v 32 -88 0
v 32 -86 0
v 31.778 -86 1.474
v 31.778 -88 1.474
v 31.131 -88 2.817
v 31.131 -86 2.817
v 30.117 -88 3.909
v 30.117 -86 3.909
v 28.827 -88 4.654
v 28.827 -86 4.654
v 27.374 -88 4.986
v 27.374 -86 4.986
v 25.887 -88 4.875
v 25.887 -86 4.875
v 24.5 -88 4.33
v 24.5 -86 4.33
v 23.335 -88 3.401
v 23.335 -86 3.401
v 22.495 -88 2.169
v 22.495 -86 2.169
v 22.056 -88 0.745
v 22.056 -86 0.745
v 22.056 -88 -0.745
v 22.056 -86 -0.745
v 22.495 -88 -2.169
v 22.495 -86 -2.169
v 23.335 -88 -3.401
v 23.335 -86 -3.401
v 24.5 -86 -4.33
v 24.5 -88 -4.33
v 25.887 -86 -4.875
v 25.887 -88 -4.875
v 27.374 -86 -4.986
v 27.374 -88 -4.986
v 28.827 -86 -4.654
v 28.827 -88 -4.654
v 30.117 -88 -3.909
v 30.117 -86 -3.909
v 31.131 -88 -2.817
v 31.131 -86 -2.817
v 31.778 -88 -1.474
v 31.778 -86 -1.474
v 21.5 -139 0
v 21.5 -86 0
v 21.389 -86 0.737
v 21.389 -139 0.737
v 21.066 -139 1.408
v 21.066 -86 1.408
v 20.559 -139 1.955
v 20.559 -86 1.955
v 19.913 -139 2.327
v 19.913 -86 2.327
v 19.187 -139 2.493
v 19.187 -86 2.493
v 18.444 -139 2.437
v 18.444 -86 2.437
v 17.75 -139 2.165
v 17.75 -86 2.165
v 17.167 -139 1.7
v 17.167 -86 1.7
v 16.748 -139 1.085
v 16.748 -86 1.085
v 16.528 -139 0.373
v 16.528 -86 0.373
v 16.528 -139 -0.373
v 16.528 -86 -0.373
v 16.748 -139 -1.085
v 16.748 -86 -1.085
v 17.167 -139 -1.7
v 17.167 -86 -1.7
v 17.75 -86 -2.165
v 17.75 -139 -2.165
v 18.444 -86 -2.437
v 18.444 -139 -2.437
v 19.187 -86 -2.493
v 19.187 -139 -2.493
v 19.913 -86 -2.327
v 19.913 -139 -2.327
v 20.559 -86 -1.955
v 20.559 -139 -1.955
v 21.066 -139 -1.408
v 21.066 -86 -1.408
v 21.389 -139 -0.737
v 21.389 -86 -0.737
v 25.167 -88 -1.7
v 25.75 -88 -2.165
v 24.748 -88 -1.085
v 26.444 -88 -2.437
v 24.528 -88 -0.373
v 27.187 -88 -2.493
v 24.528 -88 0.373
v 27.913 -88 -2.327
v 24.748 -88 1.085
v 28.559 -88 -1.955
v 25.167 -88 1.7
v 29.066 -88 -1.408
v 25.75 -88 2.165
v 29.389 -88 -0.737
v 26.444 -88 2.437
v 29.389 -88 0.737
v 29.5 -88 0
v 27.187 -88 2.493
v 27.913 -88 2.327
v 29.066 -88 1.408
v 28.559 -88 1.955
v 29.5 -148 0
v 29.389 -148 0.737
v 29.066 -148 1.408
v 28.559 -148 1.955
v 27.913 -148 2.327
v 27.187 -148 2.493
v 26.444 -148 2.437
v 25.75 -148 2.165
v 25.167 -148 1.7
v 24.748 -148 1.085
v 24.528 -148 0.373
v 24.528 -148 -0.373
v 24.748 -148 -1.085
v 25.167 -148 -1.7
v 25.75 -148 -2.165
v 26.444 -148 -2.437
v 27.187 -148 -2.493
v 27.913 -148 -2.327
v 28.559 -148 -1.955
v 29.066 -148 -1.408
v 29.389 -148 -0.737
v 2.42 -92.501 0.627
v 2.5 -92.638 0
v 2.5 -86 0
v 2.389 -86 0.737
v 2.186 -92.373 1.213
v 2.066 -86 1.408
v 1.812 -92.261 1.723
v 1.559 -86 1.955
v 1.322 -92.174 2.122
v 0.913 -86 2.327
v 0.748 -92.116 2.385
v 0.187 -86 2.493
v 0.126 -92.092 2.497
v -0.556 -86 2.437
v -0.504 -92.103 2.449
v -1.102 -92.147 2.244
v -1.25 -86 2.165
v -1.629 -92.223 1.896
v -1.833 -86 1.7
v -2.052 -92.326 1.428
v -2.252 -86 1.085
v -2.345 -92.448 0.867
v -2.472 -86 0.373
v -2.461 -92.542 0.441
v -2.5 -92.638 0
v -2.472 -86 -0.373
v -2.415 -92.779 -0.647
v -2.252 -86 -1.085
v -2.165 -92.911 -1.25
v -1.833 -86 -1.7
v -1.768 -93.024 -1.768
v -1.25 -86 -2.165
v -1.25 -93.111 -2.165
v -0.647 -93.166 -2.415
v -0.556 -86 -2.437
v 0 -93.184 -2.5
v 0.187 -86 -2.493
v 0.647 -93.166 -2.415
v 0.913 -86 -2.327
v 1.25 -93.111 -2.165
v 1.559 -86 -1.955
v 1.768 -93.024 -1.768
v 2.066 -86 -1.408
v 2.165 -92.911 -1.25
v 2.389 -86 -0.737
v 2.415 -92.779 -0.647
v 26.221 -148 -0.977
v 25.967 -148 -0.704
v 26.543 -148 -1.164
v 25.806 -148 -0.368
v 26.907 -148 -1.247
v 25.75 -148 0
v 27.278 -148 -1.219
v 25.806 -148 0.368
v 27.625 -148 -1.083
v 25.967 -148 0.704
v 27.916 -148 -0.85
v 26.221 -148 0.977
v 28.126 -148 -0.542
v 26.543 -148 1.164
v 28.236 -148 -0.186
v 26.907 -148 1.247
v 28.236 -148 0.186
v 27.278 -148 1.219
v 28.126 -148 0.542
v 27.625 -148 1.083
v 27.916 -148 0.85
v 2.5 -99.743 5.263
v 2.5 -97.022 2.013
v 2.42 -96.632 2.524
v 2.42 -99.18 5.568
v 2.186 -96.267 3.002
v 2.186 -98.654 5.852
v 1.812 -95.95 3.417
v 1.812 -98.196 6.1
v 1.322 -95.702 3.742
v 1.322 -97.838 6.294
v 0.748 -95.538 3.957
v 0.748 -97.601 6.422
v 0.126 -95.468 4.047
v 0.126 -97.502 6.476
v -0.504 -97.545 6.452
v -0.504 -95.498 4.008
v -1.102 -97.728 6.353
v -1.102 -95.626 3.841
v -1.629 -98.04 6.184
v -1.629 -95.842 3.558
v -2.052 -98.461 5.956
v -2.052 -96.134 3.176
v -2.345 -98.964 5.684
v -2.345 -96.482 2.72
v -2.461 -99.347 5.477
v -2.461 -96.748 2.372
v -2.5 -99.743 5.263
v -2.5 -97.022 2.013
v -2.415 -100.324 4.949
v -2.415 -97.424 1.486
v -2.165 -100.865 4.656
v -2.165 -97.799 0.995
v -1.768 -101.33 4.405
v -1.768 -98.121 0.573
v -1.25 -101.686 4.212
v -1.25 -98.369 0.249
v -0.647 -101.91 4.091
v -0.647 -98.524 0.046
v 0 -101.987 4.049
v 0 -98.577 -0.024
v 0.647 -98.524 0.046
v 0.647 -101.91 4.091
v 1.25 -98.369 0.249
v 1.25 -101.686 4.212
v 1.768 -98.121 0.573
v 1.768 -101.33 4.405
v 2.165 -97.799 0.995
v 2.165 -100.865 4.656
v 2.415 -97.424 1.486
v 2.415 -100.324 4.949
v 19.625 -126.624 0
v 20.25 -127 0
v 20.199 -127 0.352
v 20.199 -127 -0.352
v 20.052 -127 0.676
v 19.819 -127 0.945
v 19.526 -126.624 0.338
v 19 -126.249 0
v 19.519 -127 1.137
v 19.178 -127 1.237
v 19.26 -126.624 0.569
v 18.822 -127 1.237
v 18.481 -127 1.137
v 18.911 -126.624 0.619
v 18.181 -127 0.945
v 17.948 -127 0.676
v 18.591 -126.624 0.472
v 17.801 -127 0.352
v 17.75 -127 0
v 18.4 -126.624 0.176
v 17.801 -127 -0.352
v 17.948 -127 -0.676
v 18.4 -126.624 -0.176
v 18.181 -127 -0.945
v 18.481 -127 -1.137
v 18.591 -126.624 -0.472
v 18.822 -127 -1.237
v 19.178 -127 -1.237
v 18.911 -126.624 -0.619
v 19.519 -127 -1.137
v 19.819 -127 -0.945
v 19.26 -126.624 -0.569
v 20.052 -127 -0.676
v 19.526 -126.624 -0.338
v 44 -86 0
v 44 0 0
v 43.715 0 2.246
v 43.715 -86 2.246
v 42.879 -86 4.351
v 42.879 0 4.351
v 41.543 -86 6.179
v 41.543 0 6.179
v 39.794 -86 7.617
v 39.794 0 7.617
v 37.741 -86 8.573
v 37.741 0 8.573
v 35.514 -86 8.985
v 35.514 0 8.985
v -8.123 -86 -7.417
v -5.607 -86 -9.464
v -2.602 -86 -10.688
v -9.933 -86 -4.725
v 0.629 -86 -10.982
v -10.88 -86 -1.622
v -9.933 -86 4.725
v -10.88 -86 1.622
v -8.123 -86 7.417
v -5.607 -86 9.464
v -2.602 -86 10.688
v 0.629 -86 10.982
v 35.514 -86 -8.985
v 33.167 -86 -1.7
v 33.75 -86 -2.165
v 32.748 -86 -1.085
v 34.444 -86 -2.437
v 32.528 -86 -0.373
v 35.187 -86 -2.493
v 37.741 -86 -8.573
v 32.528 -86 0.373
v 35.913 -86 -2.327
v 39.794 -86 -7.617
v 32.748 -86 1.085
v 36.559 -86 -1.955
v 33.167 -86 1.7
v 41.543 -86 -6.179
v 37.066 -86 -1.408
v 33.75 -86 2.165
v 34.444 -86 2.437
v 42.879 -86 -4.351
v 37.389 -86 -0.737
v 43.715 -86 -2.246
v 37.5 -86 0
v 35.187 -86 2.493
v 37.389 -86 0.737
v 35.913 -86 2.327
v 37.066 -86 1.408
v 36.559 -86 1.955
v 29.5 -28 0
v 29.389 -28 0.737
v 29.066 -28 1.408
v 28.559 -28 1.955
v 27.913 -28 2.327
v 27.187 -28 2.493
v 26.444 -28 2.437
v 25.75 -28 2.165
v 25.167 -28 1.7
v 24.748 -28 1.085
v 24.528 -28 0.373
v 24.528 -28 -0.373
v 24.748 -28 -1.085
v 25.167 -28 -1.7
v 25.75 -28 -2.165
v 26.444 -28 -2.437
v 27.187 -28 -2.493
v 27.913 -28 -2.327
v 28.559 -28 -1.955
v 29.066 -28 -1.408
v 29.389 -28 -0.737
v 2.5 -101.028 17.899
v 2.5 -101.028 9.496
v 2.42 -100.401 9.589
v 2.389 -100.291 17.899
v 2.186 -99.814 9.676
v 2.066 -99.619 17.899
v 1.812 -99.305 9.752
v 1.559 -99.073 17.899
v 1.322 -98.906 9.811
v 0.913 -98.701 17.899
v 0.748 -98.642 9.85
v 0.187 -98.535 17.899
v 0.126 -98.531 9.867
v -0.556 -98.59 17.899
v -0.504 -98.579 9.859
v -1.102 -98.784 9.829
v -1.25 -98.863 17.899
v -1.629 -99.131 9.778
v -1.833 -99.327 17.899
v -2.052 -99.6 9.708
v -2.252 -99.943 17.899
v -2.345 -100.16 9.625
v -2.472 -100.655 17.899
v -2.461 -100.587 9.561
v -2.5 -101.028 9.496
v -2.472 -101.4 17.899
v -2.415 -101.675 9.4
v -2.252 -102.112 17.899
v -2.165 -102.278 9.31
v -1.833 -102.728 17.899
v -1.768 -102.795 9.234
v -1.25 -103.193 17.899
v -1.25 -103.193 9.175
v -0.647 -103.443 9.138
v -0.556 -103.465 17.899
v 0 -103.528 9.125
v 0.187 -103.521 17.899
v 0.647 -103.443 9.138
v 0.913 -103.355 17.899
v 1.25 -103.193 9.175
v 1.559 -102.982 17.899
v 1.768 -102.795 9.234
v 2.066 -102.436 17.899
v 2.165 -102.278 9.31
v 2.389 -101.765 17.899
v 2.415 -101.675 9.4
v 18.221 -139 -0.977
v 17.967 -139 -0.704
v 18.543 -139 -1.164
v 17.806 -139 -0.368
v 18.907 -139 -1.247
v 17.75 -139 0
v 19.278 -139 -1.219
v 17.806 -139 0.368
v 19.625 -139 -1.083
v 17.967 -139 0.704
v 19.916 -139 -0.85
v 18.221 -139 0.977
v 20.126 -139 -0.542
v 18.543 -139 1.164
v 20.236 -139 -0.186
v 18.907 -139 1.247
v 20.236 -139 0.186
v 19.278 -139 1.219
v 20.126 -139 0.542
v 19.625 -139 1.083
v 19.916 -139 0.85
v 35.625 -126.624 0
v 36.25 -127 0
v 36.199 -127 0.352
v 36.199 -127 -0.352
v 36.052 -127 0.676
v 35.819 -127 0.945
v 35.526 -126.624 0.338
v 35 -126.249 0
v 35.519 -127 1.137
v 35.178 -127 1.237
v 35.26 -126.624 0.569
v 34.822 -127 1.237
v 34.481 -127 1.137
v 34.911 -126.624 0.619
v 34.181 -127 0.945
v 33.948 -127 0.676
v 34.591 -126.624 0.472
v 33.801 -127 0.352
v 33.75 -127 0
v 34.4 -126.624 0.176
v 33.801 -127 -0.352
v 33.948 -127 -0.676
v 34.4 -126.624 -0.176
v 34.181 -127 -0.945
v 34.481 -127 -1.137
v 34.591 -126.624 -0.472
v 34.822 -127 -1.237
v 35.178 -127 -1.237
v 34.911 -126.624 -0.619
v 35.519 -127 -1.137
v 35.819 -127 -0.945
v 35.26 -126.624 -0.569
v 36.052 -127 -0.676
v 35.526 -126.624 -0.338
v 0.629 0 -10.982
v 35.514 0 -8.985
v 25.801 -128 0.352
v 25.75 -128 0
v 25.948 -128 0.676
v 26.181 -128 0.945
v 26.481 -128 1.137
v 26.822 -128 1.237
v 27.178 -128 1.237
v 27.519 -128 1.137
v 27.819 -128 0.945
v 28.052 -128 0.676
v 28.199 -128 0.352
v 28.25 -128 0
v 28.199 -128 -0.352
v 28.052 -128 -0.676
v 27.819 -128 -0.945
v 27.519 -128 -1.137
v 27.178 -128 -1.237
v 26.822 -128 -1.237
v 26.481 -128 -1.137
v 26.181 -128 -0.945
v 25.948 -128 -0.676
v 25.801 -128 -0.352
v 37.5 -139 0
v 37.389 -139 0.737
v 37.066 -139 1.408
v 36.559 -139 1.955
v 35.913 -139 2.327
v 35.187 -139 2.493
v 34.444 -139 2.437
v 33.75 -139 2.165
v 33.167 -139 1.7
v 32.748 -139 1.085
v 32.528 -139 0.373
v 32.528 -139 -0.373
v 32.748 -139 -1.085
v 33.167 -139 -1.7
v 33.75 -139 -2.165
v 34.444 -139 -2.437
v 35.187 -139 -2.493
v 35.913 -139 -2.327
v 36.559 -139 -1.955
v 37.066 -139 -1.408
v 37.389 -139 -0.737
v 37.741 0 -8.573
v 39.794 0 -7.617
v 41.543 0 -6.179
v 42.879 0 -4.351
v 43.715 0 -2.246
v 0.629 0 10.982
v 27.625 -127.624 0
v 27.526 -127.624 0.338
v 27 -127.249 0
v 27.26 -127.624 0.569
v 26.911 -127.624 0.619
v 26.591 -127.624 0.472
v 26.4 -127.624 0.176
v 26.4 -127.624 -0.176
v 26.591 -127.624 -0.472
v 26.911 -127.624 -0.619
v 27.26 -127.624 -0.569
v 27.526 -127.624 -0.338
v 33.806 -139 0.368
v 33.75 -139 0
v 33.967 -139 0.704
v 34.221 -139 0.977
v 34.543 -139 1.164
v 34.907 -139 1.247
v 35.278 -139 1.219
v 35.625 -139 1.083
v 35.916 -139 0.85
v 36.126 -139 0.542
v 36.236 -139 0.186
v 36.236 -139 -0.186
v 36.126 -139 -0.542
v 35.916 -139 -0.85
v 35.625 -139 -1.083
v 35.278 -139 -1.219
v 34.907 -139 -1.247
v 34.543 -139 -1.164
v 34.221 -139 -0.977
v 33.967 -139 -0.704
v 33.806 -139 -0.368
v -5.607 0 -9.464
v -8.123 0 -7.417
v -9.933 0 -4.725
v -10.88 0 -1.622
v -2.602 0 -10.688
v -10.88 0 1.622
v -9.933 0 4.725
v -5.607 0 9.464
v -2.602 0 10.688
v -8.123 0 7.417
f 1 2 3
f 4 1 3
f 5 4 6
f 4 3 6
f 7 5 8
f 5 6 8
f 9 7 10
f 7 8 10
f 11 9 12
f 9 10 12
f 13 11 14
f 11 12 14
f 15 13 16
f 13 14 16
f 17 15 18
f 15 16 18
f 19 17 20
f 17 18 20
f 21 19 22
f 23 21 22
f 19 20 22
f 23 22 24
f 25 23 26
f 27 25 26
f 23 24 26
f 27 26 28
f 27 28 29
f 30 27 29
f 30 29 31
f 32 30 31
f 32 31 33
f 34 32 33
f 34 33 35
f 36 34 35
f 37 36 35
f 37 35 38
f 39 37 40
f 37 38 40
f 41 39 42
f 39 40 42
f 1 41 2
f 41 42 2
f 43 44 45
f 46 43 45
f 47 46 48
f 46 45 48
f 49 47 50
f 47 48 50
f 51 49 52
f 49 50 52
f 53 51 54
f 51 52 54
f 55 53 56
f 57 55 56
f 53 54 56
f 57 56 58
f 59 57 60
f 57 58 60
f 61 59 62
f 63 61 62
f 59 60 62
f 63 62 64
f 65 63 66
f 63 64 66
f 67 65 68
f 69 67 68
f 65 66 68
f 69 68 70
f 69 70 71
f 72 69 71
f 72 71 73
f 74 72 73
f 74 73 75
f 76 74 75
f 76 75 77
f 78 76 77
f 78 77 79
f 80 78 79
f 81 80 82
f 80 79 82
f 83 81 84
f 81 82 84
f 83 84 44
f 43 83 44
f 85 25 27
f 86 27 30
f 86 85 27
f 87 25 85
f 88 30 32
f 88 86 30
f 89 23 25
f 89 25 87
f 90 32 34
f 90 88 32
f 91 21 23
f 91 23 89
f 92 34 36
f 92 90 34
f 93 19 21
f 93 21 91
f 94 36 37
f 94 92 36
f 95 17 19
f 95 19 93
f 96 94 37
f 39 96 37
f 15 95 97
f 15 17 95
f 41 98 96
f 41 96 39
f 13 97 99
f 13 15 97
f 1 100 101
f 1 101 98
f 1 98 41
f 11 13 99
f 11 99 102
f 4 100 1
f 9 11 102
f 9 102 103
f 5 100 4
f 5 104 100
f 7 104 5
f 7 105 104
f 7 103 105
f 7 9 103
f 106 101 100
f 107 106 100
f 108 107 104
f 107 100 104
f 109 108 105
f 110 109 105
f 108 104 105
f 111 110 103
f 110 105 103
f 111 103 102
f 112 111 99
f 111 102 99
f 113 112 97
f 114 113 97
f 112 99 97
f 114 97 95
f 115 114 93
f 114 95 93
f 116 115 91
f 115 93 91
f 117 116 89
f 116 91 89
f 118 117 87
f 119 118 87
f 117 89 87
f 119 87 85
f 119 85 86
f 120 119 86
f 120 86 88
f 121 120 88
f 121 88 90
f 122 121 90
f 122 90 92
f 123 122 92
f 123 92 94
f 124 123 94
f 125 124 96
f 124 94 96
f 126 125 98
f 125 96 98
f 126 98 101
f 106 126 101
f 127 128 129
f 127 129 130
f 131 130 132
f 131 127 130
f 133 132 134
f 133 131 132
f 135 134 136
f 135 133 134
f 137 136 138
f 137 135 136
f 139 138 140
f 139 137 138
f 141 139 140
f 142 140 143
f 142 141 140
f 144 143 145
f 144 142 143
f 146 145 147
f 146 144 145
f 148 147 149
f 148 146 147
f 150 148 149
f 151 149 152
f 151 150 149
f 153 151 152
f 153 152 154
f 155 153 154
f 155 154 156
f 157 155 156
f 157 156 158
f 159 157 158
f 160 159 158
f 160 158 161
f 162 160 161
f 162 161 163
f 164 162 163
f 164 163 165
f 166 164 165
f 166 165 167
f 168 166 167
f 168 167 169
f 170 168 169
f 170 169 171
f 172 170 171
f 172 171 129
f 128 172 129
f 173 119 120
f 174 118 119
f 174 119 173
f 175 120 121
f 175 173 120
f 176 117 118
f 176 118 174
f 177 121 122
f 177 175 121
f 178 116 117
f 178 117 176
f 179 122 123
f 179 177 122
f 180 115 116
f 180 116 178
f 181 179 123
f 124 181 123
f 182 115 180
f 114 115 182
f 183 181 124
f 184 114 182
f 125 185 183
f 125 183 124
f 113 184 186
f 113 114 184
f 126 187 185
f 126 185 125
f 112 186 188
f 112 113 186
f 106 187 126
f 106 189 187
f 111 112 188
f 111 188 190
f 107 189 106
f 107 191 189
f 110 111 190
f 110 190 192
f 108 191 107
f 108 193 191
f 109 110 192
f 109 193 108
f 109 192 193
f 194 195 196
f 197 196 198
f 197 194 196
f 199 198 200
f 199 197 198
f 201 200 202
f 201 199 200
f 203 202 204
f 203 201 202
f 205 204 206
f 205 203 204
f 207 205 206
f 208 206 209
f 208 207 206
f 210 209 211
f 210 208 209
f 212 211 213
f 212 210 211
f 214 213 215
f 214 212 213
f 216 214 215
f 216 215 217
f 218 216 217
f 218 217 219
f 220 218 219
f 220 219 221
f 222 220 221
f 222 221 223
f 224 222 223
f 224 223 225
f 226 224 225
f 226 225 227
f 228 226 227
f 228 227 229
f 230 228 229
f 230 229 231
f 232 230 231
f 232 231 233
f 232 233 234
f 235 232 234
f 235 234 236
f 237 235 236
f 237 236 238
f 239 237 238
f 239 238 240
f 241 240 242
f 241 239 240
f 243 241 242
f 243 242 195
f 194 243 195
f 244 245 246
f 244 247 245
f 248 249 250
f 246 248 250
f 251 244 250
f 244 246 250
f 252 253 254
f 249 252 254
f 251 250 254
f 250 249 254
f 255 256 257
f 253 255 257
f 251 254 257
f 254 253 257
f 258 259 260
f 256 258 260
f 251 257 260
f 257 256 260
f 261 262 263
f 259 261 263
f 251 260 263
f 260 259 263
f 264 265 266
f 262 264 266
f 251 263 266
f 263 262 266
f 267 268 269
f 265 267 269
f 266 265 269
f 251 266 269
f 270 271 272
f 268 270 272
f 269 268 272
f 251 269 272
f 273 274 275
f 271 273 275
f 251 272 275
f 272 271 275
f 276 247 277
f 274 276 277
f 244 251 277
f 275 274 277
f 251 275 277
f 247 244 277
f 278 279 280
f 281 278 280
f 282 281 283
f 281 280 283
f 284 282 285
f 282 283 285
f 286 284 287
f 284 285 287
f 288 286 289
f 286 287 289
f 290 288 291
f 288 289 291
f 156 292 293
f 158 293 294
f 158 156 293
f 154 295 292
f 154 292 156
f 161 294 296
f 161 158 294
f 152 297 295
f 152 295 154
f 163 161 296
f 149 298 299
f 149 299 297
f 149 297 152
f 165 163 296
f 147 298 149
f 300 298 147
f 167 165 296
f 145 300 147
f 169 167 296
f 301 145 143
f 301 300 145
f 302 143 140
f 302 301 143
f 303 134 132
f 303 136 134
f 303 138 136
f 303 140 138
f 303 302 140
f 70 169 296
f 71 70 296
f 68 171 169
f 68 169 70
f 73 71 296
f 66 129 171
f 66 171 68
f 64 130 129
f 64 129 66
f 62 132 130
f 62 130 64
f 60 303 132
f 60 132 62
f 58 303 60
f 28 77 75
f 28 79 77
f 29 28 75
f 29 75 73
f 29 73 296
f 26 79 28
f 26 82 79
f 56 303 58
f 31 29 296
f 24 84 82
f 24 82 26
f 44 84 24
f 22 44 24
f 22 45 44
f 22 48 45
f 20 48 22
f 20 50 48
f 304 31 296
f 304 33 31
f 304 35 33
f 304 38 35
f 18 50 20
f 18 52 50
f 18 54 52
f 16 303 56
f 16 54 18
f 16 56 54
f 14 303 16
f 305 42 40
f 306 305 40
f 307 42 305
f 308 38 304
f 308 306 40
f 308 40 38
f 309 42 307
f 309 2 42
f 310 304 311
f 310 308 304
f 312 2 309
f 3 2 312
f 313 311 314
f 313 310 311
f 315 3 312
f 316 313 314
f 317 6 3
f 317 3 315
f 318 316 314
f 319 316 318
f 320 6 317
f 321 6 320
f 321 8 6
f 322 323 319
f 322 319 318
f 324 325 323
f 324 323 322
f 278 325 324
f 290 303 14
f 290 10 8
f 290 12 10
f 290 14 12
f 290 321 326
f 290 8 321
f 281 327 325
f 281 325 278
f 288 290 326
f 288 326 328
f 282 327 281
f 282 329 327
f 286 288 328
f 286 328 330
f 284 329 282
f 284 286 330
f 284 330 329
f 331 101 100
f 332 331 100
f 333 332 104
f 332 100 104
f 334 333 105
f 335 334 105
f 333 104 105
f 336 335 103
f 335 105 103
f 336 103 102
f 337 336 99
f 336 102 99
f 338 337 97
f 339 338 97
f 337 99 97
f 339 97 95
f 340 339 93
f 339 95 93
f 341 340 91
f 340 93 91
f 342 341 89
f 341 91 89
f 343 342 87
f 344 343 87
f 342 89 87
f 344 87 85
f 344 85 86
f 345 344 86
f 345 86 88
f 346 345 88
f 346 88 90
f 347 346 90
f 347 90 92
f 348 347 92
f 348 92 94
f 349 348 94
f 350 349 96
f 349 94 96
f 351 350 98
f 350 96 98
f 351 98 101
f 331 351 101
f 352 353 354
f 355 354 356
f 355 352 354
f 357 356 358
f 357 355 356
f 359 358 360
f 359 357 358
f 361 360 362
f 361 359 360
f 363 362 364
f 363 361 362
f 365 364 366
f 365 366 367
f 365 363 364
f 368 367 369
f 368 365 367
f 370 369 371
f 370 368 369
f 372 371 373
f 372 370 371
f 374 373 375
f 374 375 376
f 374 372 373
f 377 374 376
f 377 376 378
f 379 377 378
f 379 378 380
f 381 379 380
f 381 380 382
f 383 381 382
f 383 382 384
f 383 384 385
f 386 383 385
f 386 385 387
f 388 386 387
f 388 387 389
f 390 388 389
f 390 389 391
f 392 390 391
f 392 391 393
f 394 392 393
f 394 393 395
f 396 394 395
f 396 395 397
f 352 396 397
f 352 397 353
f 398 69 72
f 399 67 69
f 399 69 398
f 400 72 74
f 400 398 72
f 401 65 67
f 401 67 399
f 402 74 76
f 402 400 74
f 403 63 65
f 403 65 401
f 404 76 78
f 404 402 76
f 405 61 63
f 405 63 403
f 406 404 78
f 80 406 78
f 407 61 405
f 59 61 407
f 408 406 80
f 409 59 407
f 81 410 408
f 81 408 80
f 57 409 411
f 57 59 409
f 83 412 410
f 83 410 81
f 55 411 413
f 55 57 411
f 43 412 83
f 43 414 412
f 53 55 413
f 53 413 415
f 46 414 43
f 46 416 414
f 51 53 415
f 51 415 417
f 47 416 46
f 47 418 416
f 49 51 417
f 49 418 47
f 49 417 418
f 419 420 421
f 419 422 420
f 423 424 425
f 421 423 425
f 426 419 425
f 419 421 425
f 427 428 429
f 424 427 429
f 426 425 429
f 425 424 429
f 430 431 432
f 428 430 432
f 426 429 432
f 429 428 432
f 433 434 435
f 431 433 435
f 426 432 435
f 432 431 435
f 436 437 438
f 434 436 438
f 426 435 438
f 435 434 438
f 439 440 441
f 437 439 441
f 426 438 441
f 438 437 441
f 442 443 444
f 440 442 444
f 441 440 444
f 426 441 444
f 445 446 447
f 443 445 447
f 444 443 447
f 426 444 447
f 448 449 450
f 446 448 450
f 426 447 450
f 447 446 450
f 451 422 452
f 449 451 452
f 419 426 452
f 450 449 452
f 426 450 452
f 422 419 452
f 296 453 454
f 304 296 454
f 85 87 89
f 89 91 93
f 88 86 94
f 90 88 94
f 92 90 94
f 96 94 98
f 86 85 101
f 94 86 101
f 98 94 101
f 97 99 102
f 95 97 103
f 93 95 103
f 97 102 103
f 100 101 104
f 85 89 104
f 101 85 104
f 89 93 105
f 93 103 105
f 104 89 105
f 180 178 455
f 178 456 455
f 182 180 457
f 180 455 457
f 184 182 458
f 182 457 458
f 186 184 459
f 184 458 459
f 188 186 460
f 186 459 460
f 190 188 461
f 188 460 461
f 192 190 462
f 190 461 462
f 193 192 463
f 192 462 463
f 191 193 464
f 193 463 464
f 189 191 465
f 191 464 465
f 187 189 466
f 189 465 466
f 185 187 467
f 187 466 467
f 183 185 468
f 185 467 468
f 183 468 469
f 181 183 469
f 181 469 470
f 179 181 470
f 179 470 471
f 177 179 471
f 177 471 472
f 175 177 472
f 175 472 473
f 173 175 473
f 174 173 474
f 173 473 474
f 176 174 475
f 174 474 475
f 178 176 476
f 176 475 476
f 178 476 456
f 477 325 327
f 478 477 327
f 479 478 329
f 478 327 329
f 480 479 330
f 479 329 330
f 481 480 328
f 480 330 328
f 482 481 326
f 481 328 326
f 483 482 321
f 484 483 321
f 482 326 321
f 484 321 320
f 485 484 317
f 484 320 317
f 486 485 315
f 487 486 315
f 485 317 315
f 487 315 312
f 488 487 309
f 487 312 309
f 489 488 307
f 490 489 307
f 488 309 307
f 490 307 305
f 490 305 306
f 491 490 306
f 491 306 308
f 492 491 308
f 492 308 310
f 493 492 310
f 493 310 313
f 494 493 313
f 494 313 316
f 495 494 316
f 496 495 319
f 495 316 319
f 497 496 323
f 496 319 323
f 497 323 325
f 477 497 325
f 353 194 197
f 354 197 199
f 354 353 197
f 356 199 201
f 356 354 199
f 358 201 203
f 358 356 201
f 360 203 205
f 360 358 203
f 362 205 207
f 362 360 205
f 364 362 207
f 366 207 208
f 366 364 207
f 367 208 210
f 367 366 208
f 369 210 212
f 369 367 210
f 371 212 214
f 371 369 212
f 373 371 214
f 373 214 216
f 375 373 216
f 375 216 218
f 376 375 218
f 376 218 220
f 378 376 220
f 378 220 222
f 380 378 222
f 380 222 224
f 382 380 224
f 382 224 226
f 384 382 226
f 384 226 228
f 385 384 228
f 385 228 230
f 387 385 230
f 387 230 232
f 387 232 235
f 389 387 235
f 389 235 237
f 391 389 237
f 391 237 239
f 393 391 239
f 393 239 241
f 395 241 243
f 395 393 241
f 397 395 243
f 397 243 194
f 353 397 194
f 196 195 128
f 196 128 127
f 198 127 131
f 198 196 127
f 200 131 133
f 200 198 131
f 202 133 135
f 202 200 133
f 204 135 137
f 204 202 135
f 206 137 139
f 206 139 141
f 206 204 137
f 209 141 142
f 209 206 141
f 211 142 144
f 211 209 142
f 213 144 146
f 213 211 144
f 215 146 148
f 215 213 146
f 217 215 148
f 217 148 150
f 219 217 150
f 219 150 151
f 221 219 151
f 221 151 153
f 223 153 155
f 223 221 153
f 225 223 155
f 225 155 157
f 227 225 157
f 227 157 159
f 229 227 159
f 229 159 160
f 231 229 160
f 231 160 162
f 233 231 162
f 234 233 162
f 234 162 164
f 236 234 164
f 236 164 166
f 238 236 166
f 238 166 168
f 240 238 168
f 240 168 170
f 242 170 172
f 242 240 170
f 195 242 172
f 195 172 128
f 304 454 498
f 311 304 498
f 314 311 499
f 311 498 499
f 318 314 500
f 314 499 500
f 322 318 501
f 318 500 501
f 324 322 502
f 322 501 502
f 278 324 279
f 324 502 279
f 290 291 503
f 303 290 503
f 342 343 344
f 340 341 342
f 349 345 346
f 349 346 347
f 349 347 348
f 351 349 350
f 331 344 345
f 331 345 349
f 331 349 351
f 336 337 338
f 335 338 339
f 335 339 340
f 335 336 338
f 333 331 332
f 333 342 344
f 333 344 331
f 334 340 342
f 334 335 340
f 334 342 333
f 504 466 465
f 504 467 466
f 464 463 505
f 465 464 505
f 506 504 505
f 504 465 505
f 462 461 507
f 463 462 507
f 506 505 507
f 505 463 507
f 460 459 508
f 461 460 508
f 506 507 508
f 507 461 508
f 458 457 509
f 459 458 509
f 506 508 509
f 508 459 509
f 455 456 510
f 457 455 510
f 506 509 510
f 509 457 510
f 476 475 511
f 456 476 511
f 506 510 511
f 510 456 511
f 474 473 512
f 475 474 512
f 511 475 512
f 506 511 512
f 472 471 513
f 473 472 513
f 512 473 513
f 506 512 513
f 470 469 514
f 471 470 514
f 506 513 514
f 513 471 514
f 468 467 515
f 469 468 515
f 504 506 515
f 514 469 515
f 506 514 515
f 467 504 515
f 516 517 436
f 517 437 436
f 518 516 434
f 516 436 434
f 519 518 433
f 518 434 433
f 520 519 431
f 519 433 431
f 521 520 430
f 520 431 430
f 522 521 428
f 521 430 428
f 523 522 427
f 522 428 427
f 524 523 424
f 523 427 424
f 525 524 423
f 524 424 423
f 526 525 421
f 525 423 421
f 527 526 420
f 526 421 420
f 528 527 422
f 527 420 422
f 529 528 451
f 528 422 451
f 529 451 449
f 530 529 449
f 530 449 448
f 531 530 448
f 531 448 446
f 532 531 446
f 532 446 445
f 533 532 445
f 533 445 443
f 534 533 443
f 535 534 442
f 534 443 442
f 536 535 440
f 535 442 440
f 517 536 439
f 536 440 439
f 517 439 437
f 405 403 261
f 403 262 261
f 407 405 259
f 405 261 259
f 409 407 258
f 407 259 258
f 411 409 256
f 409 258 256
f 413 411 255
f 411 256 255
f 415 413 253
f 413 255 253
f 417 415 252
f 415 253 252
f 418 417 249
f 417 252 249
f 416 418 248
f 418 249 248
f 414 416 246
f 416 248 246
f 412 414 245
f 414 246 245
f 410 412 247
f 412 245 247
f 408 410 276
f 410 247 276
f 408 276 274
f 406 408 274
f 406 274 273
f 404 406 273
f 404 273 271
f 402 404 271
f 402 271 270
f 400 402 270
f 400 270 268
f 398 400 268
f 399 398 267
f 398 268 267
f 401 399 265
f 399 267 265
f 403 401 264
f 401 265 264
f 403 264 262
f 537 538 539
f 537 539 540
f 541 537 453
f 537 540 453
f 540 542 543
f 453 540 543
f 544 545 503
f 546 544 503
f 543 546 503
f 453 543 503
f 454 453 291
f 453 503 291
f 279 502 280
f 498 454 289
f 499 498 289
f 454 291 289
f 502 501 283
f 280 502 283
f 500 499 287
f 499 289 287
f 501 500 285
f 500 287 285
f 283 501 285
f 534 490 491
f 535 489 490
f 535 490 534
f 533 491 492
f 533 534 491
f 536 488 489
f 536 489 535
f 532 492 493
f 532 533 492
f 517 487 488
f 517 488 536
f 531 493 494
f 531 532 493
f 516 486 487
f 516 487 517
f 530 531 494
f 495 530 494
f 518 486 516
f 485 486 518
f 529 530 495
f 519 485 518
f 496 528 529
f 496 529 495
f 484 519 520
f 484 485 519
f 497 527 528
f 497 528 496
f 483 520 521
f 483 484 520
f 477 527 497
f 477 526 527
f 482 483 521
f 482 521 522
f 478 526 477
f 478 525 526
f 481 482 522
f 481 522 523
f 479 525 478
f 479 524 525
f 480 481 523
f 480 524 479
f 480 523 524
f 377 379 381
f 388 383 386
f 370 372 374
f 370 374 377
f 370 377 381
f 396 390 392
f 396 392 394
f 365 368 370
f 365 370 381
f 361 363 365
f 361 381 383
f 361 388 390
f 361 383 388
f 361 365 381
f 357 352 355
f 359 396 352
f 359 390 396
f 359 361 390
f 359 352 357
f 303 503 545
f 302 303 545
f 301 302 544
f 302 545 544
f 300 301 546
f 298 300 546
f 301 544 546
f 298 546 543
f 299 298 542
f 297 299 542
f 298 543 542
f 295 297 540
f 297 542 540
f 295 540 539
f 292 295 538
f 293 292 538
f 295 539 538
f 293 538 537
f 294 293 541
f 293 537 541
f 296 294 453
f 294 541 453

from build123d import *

# Parameters (mm, degrees)
F1_DEPTH  = 86
F2_R      = 5
F3_DEPTH  = 2
F2_R_2    = 2.5
F4_DEPTH  = 53
F5_R      = 2.5
F6_DEPTH  = 60
F7_DEPTH  = 60
F9_D      = 2.5
F9_DEPTH  = 12
F9_TIP    = 0.7510757738
F11_D     = 2.5
F11_DEPTH = 20
F11_TIP   = 0.7510757738


with BuildPart() as f1:
    # F0 (on Front) → F1 (new body)
    with BuildSketch(Plane.XZ):
        with BuildLine():
            ThreePointArc((0.6285714286, -10.9820261318), (7.99732098, -7.5526721856), (11, 0))
            ThreePointArc((11, 0), (7.99732098, 7.5526721856), (0.6285714286, 10.9820261318))
            ThreePointArc((0.6285714286, 10.9820261318), (-11, 0), (0.6285714286, -10.9820261318))
        make_face()
        with BuildLine():
            ThreePointArc((0.6285714286, 10.9820261318), (7.99732098, 7.5526721856), (11, 0))
            ThreePointArc((11, 0), (7.99732098, -7.5526721856), (0.6285714286, -10.9820261318))
            Line((0.6285714286, -10.9820261318), (35.5142857143, -8.9852941078))
            ThreePointArc((35.5142857143, -8.9852941078), (26, 0), (35.5142857143, 8.9852941078))
            Line((35.5142857143, 8.9852941078), (0.6285714286, 10.9820261318))
        make_face()
        with BuildLine():
            ThreePointArc((44, 0), (41.54326262, 6.1794590609), (35.5142857143, 8.9852941078))
            ThreePointArc((35.5142857143, 8.9852941078), (26, 0), (35.5142857143, -8.9852941078))
            ThreePointArc((35.5142857143, -8.9852941078), (41.54326262, -6.1794590609), (44, 0))
        make_face()
    extrude(amount=F1_DEPTH)

    # F2 (on face) → F3 (join)
    with BuildSketch(Plane.XZ.offset(86)):
        with Locations((27, 0)):
            Circle(F2_R)
    extrude(amount=F3_DEPTH)

    # F2 (on face) → F4 (join)
    with BuildSketch(Plane.XZ.offset(86)):
        with Locations((19, 0)):
            Circle(F2_R_2)
        with Locations((35, 0)):
            Circle(F2_R_2)
    extrude(amount=F4_DEPTH)

    # F5 (on face) → F6 (cut)
    with BuildSketch(Plane.XZ.offset(88)):
        with Locations((27, 0)):
            Circle(F5_R)
    extrude(amount=-F6_DEPTH, mode=Mode.SUBTRACT)

    # F9
    with Locations(Plane.XZ.offset(139)):
        with Locations((19, 0), (35, 0)):
            Hole(F9_D / 2, depth=F9_DEPTH)
            with Locations((0, 0, -(F9_DEPTH + F9_TIP / 2))):  # 118° drill point
                Cone(0, F9_D / 2, F9_TIP, mode=Mode.SUBTRACT)

    # F13: sweep along a path in F12
    with BuildLine(Plane.YZ) as f13_path:
        Line((-86, 0), (-92.6378890872, 0))
        Line((-92.6378890872, 0), (-97.0217064023, 2.0130740013))
        Line((-97.0217064023, 2.0130740013), (-99.7427776456, 5.263236817))
        Line((-99.7427776456, 5.263236817), (-101.0277271271, 9.4960071146))
        Line((-101.0277271271, 9.4960071146), (-101.0277271271, 17.8988836706))
    # F2 (on face) → F13 (sweep)
    with BuildSketch(Plane.XZ.offset(86)):
        Circle(F2_R_2)
    sweep(path=f13_path.line, transition=Transition.RIGHT)


with BuildPart() as f7:
    # F5 (on face) → F7 (new body)
    with BuildSketch(Plane.XZ.offset(88)):
        with Locations((27, 0)):
            Circle(F5_R)
    extrude(amount=F7_DEPTH)

    # F11
    with Locations(Plane.XZ.offset(148)):
        with Locations((27, 0)):
            Hole(F11_D / 2, depth=F11_DEPTH)
            with Locations((0, 0, -(F11_DEPTH + F11_TIP / 2))):  # 118° drill point
                Cone(0, F11_D / 2, F11_TIP, mode=Mode.SUBTRACT)


solid = Compound([f1.part, f7.part])
